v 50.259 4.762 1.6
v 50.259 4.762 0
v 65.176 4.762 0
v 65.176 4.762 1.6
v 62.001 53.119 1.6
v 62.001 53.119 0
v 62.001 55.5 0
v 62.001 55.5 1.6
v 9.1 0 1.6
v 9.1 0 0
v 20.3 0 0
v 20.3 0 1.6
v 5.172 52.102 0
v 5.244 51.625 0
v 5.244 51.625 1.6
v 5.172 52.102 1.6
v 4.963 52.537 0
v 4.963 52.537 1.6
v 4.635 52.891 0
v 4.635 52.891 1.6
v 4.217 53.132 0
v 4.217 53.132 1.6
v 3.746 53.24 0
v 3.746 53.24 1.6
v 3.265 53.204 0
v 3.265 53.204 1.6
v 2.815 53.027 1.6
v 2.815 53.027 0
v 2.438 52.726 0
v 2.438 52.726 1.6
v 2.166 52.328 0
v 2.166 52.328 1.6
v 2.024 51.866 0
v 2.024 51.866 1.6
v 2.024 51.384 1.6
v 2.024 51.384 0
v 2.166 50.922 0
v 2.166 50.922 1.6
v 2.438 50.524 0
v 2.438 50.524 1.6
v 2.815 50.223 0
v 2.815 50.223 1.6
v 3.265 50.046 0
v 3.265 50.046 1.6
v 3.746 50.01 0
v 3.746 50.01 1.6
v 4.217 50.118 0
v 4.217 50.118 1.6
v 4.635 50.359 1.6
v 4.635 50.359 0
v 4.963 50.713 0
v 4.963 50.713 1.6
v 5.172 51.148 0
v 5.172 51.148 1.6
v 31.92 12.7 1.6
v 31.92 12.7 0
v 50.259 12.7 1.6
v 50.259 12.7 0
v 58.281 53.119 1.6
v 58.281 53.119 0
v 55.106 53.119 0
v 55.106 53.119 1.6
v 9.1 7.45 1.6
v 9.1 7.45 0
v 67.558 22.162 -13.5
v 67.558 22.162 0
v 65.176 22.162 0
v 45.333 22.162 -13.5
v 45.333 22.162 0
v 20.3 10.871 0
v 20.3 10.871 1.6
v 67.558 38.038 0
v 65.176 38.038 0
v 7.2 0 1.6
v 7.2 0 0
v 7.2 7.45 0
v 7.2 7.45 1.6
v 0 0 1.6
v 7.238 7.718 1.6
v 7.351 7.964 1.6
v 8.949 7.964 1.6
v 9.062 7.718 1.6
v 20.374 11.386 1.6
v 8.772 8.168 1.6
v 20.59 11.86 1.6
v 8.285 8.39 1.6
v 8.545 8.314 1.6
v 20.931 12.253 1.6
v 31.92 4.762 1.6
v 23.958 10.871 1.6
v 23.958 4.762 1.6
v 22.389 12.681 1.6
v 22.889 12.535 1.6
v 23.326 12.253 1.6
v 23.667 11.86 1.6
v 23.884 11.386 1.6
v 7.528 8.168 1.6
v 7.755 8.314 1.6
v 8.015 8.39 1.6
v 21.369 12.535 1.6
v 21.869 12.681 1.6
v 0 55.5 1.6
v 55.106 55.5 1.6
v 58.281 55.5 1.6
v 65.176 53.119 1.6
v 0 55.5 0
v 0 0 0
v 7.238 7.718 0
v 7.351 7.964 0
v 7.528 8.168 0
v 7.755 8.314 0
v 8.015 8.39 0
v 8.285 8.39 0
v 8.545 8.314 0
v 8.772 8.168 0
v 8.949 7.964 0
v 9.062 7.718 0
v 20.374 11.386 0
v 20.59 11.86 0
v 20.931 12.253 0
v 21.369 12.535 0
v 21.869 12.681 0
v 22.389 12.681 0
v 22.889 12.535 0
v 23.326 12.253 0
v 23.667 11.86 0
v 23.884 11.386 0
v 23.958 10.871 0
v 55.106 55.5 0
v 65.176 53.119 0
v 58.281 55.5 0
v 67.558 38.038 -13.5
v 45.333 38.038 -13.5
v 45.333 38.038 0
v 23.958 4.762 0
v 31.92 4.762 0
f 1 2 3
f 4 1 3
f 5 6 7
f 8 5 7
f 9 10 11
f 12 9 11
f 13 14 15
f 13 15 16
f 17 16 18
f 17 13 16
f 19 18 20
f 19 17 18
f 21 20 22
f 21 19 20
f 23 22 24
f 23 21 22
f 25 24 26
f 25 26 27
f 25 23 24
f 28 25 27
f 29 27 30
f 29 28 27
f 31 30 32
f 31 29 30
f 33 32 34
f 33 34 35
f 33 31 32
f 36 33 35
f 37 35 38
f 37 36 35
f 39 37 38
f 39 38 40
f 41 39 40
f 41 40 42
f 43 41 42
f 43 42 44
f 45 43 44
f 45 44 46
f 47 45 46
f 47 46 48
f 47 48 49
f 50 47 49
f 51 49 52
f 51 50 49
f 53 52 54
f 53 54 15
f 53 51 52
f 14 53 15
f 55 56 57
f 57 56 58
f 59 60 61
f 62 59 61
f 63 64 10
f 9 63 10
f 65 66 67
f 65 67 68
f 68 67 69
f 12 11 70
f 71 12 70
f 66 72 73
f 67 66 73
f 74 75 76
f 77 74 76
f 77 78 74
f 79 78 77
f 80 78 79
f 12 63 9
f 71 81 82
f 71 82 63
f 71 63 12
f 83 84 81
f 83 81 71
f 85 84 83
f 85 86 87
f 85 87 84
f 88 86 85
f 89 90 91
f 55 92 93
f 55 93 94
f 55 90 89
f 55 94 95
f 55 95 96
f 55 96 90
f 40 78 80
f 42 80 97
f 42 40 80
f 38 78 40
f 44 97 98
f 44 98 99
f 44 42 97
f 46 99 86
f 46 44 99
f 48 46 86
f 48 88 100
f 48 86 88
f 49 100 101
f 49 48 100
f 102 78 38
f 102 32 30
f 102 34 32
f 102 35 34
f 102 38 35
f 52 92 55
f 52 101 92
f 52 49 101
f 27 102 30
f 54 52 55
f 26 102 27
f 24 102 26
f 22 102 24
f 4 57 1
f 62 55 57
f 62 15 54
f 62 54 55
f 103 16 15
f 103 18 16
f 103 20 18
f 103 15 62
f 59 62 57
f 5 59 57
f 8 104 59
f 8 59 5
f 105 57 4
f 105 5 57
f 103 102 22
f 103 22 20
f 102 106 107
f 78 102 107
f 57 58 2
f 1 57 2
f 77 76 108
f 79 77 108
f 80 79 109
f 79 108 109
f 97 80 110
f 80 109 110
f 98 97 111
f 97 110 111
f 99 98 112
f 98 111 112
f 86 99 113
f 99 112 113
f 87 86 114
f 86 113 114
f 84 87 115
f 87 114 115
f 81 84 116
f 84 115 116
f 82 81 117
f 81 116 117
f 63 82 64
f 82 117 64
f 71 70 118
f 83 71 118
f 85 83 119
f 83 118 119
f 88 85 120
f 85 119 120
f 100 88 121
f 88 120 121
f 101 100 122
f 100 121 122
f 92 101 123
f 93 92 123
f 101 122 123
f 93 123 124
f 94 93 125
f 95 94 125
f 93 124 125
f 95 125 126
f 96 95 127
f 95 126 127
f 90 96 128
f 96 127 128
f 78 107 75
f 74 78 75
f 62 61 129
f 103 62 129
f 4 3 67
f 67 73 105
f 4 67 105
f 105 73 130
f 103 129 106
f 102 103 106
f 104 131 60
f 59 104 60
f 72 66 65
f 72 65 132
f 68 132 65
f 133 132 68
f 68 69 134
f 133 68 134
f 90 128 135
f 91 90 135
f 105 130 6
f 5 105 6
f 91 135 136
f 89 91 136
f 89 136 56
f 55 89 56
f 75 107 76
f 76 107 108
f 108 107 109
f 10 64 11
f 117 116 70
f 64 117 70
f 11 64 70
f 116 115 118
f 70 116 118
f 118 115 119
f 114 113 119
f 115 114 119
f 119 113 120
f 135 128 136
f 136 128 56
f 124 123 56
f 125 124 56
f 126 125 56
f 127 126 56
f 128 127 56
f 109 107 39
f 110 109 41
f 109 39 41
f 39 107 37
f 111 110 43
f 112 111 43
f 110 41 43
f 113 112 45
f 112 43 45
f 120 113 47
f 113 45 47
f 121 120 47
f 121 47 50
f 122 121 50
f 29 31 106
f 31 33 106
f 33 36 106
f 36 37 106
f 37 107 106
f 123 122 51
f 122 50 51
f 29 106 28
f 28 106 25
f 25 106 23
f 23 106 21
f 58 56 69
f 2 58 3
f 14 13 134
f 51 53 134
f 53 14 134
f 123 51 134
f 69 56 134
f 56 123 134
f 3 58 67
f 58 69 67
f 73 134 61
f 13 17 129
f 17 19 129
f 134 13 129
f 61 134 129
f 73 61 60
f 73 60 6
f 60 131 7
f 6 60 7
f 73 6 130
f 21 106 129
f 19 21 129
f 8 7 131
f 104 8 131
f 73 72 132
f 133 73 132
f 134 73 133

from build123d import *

# Parameters (mm, degrees)
SKETCH2_R           = 1.61925
BOSS_EXTRUDE1_DEPTH = 1.6
SKETCH3_W           = 22.225
SKETCH3_H           = 15.875
BOSS_EXTRUDE2_DEPTH = 13.5


with BuildPart() as part:
    # Sketch2 → Boss-Extrude1 (new body)
    with BuildSketch(Plane.XY):
        with BuildLine():
            Line((0, 0), (7.2, 0))
            Line((7.2, 0), (7.2, 7.45))
            ThreePointArc((7.2, 7.45), (8.15, 8.4), (9.1, 7.45))
            Line((9.1, 7.45), (9.1, 0))
            Line((9.1, 0), (20.3, 0))
            Line((20.3, 0), (20.3, 10.8712))
            ThreePointArc((20.3, 10.8712), (22.1288, 12.7), (23.9576, 10.8712))
            Line((23.9576, 10.8712), (23.9576, 4.7625))
            Line((23.9576, 4.7625), (31.9205, 4.7625))
            Line((31.9205, 4.7625), (31.9205, 12.7))
            Line((31.9205, 12.7), (50.2593, 12.7))
            Line((50.2593, 12.7), (50.2593, 4.7625))
            Line((50.2593, 4.7625), (65.1764, 4.7625))
            Line((65.1764, 4.7625), (65.1764, 53.11875))
            Line((65.1764, 53.11875), (62.0014, 53.11875))
            Line((62.0014, 53.11875), (62.0014, 55.5))
            Line((62.0014, 55.5), (58.2814, 55.5))
            Line((58.2814, 55.5), (58.2814, 53.11875))
            Line((58.2814, 53.11875), (55.1064, 53.11875))
            Line((55.1064, 53.11875), (55.1064, 55.5))
            Line((55.1064, 55.5), (0, 55.5))
            Line((0, 55.5), (0, 0))
        make_face()
        with Locations((3.625, 51.625)):
            Circle(SKETCH2_R, mode=Mode.SUBTRACT)
    extrude(amount=BOSS_EXTRUDE1_DEPTH)

    # Sketch3 → Boss-Extrude2 (add)
    with BuildSketch(Plane(origin=(0, 0, 0), x_dir=(-1, 0, 0), z_dir=(0, 0, -1))):
        with Locations((-56.44515, 30.1)):
            Rectangle(SKETCH3_W, SKETCH3_H)
    extrude(amount=BOSS_EXTRUDE2_DEPTH)


solid = part.part
